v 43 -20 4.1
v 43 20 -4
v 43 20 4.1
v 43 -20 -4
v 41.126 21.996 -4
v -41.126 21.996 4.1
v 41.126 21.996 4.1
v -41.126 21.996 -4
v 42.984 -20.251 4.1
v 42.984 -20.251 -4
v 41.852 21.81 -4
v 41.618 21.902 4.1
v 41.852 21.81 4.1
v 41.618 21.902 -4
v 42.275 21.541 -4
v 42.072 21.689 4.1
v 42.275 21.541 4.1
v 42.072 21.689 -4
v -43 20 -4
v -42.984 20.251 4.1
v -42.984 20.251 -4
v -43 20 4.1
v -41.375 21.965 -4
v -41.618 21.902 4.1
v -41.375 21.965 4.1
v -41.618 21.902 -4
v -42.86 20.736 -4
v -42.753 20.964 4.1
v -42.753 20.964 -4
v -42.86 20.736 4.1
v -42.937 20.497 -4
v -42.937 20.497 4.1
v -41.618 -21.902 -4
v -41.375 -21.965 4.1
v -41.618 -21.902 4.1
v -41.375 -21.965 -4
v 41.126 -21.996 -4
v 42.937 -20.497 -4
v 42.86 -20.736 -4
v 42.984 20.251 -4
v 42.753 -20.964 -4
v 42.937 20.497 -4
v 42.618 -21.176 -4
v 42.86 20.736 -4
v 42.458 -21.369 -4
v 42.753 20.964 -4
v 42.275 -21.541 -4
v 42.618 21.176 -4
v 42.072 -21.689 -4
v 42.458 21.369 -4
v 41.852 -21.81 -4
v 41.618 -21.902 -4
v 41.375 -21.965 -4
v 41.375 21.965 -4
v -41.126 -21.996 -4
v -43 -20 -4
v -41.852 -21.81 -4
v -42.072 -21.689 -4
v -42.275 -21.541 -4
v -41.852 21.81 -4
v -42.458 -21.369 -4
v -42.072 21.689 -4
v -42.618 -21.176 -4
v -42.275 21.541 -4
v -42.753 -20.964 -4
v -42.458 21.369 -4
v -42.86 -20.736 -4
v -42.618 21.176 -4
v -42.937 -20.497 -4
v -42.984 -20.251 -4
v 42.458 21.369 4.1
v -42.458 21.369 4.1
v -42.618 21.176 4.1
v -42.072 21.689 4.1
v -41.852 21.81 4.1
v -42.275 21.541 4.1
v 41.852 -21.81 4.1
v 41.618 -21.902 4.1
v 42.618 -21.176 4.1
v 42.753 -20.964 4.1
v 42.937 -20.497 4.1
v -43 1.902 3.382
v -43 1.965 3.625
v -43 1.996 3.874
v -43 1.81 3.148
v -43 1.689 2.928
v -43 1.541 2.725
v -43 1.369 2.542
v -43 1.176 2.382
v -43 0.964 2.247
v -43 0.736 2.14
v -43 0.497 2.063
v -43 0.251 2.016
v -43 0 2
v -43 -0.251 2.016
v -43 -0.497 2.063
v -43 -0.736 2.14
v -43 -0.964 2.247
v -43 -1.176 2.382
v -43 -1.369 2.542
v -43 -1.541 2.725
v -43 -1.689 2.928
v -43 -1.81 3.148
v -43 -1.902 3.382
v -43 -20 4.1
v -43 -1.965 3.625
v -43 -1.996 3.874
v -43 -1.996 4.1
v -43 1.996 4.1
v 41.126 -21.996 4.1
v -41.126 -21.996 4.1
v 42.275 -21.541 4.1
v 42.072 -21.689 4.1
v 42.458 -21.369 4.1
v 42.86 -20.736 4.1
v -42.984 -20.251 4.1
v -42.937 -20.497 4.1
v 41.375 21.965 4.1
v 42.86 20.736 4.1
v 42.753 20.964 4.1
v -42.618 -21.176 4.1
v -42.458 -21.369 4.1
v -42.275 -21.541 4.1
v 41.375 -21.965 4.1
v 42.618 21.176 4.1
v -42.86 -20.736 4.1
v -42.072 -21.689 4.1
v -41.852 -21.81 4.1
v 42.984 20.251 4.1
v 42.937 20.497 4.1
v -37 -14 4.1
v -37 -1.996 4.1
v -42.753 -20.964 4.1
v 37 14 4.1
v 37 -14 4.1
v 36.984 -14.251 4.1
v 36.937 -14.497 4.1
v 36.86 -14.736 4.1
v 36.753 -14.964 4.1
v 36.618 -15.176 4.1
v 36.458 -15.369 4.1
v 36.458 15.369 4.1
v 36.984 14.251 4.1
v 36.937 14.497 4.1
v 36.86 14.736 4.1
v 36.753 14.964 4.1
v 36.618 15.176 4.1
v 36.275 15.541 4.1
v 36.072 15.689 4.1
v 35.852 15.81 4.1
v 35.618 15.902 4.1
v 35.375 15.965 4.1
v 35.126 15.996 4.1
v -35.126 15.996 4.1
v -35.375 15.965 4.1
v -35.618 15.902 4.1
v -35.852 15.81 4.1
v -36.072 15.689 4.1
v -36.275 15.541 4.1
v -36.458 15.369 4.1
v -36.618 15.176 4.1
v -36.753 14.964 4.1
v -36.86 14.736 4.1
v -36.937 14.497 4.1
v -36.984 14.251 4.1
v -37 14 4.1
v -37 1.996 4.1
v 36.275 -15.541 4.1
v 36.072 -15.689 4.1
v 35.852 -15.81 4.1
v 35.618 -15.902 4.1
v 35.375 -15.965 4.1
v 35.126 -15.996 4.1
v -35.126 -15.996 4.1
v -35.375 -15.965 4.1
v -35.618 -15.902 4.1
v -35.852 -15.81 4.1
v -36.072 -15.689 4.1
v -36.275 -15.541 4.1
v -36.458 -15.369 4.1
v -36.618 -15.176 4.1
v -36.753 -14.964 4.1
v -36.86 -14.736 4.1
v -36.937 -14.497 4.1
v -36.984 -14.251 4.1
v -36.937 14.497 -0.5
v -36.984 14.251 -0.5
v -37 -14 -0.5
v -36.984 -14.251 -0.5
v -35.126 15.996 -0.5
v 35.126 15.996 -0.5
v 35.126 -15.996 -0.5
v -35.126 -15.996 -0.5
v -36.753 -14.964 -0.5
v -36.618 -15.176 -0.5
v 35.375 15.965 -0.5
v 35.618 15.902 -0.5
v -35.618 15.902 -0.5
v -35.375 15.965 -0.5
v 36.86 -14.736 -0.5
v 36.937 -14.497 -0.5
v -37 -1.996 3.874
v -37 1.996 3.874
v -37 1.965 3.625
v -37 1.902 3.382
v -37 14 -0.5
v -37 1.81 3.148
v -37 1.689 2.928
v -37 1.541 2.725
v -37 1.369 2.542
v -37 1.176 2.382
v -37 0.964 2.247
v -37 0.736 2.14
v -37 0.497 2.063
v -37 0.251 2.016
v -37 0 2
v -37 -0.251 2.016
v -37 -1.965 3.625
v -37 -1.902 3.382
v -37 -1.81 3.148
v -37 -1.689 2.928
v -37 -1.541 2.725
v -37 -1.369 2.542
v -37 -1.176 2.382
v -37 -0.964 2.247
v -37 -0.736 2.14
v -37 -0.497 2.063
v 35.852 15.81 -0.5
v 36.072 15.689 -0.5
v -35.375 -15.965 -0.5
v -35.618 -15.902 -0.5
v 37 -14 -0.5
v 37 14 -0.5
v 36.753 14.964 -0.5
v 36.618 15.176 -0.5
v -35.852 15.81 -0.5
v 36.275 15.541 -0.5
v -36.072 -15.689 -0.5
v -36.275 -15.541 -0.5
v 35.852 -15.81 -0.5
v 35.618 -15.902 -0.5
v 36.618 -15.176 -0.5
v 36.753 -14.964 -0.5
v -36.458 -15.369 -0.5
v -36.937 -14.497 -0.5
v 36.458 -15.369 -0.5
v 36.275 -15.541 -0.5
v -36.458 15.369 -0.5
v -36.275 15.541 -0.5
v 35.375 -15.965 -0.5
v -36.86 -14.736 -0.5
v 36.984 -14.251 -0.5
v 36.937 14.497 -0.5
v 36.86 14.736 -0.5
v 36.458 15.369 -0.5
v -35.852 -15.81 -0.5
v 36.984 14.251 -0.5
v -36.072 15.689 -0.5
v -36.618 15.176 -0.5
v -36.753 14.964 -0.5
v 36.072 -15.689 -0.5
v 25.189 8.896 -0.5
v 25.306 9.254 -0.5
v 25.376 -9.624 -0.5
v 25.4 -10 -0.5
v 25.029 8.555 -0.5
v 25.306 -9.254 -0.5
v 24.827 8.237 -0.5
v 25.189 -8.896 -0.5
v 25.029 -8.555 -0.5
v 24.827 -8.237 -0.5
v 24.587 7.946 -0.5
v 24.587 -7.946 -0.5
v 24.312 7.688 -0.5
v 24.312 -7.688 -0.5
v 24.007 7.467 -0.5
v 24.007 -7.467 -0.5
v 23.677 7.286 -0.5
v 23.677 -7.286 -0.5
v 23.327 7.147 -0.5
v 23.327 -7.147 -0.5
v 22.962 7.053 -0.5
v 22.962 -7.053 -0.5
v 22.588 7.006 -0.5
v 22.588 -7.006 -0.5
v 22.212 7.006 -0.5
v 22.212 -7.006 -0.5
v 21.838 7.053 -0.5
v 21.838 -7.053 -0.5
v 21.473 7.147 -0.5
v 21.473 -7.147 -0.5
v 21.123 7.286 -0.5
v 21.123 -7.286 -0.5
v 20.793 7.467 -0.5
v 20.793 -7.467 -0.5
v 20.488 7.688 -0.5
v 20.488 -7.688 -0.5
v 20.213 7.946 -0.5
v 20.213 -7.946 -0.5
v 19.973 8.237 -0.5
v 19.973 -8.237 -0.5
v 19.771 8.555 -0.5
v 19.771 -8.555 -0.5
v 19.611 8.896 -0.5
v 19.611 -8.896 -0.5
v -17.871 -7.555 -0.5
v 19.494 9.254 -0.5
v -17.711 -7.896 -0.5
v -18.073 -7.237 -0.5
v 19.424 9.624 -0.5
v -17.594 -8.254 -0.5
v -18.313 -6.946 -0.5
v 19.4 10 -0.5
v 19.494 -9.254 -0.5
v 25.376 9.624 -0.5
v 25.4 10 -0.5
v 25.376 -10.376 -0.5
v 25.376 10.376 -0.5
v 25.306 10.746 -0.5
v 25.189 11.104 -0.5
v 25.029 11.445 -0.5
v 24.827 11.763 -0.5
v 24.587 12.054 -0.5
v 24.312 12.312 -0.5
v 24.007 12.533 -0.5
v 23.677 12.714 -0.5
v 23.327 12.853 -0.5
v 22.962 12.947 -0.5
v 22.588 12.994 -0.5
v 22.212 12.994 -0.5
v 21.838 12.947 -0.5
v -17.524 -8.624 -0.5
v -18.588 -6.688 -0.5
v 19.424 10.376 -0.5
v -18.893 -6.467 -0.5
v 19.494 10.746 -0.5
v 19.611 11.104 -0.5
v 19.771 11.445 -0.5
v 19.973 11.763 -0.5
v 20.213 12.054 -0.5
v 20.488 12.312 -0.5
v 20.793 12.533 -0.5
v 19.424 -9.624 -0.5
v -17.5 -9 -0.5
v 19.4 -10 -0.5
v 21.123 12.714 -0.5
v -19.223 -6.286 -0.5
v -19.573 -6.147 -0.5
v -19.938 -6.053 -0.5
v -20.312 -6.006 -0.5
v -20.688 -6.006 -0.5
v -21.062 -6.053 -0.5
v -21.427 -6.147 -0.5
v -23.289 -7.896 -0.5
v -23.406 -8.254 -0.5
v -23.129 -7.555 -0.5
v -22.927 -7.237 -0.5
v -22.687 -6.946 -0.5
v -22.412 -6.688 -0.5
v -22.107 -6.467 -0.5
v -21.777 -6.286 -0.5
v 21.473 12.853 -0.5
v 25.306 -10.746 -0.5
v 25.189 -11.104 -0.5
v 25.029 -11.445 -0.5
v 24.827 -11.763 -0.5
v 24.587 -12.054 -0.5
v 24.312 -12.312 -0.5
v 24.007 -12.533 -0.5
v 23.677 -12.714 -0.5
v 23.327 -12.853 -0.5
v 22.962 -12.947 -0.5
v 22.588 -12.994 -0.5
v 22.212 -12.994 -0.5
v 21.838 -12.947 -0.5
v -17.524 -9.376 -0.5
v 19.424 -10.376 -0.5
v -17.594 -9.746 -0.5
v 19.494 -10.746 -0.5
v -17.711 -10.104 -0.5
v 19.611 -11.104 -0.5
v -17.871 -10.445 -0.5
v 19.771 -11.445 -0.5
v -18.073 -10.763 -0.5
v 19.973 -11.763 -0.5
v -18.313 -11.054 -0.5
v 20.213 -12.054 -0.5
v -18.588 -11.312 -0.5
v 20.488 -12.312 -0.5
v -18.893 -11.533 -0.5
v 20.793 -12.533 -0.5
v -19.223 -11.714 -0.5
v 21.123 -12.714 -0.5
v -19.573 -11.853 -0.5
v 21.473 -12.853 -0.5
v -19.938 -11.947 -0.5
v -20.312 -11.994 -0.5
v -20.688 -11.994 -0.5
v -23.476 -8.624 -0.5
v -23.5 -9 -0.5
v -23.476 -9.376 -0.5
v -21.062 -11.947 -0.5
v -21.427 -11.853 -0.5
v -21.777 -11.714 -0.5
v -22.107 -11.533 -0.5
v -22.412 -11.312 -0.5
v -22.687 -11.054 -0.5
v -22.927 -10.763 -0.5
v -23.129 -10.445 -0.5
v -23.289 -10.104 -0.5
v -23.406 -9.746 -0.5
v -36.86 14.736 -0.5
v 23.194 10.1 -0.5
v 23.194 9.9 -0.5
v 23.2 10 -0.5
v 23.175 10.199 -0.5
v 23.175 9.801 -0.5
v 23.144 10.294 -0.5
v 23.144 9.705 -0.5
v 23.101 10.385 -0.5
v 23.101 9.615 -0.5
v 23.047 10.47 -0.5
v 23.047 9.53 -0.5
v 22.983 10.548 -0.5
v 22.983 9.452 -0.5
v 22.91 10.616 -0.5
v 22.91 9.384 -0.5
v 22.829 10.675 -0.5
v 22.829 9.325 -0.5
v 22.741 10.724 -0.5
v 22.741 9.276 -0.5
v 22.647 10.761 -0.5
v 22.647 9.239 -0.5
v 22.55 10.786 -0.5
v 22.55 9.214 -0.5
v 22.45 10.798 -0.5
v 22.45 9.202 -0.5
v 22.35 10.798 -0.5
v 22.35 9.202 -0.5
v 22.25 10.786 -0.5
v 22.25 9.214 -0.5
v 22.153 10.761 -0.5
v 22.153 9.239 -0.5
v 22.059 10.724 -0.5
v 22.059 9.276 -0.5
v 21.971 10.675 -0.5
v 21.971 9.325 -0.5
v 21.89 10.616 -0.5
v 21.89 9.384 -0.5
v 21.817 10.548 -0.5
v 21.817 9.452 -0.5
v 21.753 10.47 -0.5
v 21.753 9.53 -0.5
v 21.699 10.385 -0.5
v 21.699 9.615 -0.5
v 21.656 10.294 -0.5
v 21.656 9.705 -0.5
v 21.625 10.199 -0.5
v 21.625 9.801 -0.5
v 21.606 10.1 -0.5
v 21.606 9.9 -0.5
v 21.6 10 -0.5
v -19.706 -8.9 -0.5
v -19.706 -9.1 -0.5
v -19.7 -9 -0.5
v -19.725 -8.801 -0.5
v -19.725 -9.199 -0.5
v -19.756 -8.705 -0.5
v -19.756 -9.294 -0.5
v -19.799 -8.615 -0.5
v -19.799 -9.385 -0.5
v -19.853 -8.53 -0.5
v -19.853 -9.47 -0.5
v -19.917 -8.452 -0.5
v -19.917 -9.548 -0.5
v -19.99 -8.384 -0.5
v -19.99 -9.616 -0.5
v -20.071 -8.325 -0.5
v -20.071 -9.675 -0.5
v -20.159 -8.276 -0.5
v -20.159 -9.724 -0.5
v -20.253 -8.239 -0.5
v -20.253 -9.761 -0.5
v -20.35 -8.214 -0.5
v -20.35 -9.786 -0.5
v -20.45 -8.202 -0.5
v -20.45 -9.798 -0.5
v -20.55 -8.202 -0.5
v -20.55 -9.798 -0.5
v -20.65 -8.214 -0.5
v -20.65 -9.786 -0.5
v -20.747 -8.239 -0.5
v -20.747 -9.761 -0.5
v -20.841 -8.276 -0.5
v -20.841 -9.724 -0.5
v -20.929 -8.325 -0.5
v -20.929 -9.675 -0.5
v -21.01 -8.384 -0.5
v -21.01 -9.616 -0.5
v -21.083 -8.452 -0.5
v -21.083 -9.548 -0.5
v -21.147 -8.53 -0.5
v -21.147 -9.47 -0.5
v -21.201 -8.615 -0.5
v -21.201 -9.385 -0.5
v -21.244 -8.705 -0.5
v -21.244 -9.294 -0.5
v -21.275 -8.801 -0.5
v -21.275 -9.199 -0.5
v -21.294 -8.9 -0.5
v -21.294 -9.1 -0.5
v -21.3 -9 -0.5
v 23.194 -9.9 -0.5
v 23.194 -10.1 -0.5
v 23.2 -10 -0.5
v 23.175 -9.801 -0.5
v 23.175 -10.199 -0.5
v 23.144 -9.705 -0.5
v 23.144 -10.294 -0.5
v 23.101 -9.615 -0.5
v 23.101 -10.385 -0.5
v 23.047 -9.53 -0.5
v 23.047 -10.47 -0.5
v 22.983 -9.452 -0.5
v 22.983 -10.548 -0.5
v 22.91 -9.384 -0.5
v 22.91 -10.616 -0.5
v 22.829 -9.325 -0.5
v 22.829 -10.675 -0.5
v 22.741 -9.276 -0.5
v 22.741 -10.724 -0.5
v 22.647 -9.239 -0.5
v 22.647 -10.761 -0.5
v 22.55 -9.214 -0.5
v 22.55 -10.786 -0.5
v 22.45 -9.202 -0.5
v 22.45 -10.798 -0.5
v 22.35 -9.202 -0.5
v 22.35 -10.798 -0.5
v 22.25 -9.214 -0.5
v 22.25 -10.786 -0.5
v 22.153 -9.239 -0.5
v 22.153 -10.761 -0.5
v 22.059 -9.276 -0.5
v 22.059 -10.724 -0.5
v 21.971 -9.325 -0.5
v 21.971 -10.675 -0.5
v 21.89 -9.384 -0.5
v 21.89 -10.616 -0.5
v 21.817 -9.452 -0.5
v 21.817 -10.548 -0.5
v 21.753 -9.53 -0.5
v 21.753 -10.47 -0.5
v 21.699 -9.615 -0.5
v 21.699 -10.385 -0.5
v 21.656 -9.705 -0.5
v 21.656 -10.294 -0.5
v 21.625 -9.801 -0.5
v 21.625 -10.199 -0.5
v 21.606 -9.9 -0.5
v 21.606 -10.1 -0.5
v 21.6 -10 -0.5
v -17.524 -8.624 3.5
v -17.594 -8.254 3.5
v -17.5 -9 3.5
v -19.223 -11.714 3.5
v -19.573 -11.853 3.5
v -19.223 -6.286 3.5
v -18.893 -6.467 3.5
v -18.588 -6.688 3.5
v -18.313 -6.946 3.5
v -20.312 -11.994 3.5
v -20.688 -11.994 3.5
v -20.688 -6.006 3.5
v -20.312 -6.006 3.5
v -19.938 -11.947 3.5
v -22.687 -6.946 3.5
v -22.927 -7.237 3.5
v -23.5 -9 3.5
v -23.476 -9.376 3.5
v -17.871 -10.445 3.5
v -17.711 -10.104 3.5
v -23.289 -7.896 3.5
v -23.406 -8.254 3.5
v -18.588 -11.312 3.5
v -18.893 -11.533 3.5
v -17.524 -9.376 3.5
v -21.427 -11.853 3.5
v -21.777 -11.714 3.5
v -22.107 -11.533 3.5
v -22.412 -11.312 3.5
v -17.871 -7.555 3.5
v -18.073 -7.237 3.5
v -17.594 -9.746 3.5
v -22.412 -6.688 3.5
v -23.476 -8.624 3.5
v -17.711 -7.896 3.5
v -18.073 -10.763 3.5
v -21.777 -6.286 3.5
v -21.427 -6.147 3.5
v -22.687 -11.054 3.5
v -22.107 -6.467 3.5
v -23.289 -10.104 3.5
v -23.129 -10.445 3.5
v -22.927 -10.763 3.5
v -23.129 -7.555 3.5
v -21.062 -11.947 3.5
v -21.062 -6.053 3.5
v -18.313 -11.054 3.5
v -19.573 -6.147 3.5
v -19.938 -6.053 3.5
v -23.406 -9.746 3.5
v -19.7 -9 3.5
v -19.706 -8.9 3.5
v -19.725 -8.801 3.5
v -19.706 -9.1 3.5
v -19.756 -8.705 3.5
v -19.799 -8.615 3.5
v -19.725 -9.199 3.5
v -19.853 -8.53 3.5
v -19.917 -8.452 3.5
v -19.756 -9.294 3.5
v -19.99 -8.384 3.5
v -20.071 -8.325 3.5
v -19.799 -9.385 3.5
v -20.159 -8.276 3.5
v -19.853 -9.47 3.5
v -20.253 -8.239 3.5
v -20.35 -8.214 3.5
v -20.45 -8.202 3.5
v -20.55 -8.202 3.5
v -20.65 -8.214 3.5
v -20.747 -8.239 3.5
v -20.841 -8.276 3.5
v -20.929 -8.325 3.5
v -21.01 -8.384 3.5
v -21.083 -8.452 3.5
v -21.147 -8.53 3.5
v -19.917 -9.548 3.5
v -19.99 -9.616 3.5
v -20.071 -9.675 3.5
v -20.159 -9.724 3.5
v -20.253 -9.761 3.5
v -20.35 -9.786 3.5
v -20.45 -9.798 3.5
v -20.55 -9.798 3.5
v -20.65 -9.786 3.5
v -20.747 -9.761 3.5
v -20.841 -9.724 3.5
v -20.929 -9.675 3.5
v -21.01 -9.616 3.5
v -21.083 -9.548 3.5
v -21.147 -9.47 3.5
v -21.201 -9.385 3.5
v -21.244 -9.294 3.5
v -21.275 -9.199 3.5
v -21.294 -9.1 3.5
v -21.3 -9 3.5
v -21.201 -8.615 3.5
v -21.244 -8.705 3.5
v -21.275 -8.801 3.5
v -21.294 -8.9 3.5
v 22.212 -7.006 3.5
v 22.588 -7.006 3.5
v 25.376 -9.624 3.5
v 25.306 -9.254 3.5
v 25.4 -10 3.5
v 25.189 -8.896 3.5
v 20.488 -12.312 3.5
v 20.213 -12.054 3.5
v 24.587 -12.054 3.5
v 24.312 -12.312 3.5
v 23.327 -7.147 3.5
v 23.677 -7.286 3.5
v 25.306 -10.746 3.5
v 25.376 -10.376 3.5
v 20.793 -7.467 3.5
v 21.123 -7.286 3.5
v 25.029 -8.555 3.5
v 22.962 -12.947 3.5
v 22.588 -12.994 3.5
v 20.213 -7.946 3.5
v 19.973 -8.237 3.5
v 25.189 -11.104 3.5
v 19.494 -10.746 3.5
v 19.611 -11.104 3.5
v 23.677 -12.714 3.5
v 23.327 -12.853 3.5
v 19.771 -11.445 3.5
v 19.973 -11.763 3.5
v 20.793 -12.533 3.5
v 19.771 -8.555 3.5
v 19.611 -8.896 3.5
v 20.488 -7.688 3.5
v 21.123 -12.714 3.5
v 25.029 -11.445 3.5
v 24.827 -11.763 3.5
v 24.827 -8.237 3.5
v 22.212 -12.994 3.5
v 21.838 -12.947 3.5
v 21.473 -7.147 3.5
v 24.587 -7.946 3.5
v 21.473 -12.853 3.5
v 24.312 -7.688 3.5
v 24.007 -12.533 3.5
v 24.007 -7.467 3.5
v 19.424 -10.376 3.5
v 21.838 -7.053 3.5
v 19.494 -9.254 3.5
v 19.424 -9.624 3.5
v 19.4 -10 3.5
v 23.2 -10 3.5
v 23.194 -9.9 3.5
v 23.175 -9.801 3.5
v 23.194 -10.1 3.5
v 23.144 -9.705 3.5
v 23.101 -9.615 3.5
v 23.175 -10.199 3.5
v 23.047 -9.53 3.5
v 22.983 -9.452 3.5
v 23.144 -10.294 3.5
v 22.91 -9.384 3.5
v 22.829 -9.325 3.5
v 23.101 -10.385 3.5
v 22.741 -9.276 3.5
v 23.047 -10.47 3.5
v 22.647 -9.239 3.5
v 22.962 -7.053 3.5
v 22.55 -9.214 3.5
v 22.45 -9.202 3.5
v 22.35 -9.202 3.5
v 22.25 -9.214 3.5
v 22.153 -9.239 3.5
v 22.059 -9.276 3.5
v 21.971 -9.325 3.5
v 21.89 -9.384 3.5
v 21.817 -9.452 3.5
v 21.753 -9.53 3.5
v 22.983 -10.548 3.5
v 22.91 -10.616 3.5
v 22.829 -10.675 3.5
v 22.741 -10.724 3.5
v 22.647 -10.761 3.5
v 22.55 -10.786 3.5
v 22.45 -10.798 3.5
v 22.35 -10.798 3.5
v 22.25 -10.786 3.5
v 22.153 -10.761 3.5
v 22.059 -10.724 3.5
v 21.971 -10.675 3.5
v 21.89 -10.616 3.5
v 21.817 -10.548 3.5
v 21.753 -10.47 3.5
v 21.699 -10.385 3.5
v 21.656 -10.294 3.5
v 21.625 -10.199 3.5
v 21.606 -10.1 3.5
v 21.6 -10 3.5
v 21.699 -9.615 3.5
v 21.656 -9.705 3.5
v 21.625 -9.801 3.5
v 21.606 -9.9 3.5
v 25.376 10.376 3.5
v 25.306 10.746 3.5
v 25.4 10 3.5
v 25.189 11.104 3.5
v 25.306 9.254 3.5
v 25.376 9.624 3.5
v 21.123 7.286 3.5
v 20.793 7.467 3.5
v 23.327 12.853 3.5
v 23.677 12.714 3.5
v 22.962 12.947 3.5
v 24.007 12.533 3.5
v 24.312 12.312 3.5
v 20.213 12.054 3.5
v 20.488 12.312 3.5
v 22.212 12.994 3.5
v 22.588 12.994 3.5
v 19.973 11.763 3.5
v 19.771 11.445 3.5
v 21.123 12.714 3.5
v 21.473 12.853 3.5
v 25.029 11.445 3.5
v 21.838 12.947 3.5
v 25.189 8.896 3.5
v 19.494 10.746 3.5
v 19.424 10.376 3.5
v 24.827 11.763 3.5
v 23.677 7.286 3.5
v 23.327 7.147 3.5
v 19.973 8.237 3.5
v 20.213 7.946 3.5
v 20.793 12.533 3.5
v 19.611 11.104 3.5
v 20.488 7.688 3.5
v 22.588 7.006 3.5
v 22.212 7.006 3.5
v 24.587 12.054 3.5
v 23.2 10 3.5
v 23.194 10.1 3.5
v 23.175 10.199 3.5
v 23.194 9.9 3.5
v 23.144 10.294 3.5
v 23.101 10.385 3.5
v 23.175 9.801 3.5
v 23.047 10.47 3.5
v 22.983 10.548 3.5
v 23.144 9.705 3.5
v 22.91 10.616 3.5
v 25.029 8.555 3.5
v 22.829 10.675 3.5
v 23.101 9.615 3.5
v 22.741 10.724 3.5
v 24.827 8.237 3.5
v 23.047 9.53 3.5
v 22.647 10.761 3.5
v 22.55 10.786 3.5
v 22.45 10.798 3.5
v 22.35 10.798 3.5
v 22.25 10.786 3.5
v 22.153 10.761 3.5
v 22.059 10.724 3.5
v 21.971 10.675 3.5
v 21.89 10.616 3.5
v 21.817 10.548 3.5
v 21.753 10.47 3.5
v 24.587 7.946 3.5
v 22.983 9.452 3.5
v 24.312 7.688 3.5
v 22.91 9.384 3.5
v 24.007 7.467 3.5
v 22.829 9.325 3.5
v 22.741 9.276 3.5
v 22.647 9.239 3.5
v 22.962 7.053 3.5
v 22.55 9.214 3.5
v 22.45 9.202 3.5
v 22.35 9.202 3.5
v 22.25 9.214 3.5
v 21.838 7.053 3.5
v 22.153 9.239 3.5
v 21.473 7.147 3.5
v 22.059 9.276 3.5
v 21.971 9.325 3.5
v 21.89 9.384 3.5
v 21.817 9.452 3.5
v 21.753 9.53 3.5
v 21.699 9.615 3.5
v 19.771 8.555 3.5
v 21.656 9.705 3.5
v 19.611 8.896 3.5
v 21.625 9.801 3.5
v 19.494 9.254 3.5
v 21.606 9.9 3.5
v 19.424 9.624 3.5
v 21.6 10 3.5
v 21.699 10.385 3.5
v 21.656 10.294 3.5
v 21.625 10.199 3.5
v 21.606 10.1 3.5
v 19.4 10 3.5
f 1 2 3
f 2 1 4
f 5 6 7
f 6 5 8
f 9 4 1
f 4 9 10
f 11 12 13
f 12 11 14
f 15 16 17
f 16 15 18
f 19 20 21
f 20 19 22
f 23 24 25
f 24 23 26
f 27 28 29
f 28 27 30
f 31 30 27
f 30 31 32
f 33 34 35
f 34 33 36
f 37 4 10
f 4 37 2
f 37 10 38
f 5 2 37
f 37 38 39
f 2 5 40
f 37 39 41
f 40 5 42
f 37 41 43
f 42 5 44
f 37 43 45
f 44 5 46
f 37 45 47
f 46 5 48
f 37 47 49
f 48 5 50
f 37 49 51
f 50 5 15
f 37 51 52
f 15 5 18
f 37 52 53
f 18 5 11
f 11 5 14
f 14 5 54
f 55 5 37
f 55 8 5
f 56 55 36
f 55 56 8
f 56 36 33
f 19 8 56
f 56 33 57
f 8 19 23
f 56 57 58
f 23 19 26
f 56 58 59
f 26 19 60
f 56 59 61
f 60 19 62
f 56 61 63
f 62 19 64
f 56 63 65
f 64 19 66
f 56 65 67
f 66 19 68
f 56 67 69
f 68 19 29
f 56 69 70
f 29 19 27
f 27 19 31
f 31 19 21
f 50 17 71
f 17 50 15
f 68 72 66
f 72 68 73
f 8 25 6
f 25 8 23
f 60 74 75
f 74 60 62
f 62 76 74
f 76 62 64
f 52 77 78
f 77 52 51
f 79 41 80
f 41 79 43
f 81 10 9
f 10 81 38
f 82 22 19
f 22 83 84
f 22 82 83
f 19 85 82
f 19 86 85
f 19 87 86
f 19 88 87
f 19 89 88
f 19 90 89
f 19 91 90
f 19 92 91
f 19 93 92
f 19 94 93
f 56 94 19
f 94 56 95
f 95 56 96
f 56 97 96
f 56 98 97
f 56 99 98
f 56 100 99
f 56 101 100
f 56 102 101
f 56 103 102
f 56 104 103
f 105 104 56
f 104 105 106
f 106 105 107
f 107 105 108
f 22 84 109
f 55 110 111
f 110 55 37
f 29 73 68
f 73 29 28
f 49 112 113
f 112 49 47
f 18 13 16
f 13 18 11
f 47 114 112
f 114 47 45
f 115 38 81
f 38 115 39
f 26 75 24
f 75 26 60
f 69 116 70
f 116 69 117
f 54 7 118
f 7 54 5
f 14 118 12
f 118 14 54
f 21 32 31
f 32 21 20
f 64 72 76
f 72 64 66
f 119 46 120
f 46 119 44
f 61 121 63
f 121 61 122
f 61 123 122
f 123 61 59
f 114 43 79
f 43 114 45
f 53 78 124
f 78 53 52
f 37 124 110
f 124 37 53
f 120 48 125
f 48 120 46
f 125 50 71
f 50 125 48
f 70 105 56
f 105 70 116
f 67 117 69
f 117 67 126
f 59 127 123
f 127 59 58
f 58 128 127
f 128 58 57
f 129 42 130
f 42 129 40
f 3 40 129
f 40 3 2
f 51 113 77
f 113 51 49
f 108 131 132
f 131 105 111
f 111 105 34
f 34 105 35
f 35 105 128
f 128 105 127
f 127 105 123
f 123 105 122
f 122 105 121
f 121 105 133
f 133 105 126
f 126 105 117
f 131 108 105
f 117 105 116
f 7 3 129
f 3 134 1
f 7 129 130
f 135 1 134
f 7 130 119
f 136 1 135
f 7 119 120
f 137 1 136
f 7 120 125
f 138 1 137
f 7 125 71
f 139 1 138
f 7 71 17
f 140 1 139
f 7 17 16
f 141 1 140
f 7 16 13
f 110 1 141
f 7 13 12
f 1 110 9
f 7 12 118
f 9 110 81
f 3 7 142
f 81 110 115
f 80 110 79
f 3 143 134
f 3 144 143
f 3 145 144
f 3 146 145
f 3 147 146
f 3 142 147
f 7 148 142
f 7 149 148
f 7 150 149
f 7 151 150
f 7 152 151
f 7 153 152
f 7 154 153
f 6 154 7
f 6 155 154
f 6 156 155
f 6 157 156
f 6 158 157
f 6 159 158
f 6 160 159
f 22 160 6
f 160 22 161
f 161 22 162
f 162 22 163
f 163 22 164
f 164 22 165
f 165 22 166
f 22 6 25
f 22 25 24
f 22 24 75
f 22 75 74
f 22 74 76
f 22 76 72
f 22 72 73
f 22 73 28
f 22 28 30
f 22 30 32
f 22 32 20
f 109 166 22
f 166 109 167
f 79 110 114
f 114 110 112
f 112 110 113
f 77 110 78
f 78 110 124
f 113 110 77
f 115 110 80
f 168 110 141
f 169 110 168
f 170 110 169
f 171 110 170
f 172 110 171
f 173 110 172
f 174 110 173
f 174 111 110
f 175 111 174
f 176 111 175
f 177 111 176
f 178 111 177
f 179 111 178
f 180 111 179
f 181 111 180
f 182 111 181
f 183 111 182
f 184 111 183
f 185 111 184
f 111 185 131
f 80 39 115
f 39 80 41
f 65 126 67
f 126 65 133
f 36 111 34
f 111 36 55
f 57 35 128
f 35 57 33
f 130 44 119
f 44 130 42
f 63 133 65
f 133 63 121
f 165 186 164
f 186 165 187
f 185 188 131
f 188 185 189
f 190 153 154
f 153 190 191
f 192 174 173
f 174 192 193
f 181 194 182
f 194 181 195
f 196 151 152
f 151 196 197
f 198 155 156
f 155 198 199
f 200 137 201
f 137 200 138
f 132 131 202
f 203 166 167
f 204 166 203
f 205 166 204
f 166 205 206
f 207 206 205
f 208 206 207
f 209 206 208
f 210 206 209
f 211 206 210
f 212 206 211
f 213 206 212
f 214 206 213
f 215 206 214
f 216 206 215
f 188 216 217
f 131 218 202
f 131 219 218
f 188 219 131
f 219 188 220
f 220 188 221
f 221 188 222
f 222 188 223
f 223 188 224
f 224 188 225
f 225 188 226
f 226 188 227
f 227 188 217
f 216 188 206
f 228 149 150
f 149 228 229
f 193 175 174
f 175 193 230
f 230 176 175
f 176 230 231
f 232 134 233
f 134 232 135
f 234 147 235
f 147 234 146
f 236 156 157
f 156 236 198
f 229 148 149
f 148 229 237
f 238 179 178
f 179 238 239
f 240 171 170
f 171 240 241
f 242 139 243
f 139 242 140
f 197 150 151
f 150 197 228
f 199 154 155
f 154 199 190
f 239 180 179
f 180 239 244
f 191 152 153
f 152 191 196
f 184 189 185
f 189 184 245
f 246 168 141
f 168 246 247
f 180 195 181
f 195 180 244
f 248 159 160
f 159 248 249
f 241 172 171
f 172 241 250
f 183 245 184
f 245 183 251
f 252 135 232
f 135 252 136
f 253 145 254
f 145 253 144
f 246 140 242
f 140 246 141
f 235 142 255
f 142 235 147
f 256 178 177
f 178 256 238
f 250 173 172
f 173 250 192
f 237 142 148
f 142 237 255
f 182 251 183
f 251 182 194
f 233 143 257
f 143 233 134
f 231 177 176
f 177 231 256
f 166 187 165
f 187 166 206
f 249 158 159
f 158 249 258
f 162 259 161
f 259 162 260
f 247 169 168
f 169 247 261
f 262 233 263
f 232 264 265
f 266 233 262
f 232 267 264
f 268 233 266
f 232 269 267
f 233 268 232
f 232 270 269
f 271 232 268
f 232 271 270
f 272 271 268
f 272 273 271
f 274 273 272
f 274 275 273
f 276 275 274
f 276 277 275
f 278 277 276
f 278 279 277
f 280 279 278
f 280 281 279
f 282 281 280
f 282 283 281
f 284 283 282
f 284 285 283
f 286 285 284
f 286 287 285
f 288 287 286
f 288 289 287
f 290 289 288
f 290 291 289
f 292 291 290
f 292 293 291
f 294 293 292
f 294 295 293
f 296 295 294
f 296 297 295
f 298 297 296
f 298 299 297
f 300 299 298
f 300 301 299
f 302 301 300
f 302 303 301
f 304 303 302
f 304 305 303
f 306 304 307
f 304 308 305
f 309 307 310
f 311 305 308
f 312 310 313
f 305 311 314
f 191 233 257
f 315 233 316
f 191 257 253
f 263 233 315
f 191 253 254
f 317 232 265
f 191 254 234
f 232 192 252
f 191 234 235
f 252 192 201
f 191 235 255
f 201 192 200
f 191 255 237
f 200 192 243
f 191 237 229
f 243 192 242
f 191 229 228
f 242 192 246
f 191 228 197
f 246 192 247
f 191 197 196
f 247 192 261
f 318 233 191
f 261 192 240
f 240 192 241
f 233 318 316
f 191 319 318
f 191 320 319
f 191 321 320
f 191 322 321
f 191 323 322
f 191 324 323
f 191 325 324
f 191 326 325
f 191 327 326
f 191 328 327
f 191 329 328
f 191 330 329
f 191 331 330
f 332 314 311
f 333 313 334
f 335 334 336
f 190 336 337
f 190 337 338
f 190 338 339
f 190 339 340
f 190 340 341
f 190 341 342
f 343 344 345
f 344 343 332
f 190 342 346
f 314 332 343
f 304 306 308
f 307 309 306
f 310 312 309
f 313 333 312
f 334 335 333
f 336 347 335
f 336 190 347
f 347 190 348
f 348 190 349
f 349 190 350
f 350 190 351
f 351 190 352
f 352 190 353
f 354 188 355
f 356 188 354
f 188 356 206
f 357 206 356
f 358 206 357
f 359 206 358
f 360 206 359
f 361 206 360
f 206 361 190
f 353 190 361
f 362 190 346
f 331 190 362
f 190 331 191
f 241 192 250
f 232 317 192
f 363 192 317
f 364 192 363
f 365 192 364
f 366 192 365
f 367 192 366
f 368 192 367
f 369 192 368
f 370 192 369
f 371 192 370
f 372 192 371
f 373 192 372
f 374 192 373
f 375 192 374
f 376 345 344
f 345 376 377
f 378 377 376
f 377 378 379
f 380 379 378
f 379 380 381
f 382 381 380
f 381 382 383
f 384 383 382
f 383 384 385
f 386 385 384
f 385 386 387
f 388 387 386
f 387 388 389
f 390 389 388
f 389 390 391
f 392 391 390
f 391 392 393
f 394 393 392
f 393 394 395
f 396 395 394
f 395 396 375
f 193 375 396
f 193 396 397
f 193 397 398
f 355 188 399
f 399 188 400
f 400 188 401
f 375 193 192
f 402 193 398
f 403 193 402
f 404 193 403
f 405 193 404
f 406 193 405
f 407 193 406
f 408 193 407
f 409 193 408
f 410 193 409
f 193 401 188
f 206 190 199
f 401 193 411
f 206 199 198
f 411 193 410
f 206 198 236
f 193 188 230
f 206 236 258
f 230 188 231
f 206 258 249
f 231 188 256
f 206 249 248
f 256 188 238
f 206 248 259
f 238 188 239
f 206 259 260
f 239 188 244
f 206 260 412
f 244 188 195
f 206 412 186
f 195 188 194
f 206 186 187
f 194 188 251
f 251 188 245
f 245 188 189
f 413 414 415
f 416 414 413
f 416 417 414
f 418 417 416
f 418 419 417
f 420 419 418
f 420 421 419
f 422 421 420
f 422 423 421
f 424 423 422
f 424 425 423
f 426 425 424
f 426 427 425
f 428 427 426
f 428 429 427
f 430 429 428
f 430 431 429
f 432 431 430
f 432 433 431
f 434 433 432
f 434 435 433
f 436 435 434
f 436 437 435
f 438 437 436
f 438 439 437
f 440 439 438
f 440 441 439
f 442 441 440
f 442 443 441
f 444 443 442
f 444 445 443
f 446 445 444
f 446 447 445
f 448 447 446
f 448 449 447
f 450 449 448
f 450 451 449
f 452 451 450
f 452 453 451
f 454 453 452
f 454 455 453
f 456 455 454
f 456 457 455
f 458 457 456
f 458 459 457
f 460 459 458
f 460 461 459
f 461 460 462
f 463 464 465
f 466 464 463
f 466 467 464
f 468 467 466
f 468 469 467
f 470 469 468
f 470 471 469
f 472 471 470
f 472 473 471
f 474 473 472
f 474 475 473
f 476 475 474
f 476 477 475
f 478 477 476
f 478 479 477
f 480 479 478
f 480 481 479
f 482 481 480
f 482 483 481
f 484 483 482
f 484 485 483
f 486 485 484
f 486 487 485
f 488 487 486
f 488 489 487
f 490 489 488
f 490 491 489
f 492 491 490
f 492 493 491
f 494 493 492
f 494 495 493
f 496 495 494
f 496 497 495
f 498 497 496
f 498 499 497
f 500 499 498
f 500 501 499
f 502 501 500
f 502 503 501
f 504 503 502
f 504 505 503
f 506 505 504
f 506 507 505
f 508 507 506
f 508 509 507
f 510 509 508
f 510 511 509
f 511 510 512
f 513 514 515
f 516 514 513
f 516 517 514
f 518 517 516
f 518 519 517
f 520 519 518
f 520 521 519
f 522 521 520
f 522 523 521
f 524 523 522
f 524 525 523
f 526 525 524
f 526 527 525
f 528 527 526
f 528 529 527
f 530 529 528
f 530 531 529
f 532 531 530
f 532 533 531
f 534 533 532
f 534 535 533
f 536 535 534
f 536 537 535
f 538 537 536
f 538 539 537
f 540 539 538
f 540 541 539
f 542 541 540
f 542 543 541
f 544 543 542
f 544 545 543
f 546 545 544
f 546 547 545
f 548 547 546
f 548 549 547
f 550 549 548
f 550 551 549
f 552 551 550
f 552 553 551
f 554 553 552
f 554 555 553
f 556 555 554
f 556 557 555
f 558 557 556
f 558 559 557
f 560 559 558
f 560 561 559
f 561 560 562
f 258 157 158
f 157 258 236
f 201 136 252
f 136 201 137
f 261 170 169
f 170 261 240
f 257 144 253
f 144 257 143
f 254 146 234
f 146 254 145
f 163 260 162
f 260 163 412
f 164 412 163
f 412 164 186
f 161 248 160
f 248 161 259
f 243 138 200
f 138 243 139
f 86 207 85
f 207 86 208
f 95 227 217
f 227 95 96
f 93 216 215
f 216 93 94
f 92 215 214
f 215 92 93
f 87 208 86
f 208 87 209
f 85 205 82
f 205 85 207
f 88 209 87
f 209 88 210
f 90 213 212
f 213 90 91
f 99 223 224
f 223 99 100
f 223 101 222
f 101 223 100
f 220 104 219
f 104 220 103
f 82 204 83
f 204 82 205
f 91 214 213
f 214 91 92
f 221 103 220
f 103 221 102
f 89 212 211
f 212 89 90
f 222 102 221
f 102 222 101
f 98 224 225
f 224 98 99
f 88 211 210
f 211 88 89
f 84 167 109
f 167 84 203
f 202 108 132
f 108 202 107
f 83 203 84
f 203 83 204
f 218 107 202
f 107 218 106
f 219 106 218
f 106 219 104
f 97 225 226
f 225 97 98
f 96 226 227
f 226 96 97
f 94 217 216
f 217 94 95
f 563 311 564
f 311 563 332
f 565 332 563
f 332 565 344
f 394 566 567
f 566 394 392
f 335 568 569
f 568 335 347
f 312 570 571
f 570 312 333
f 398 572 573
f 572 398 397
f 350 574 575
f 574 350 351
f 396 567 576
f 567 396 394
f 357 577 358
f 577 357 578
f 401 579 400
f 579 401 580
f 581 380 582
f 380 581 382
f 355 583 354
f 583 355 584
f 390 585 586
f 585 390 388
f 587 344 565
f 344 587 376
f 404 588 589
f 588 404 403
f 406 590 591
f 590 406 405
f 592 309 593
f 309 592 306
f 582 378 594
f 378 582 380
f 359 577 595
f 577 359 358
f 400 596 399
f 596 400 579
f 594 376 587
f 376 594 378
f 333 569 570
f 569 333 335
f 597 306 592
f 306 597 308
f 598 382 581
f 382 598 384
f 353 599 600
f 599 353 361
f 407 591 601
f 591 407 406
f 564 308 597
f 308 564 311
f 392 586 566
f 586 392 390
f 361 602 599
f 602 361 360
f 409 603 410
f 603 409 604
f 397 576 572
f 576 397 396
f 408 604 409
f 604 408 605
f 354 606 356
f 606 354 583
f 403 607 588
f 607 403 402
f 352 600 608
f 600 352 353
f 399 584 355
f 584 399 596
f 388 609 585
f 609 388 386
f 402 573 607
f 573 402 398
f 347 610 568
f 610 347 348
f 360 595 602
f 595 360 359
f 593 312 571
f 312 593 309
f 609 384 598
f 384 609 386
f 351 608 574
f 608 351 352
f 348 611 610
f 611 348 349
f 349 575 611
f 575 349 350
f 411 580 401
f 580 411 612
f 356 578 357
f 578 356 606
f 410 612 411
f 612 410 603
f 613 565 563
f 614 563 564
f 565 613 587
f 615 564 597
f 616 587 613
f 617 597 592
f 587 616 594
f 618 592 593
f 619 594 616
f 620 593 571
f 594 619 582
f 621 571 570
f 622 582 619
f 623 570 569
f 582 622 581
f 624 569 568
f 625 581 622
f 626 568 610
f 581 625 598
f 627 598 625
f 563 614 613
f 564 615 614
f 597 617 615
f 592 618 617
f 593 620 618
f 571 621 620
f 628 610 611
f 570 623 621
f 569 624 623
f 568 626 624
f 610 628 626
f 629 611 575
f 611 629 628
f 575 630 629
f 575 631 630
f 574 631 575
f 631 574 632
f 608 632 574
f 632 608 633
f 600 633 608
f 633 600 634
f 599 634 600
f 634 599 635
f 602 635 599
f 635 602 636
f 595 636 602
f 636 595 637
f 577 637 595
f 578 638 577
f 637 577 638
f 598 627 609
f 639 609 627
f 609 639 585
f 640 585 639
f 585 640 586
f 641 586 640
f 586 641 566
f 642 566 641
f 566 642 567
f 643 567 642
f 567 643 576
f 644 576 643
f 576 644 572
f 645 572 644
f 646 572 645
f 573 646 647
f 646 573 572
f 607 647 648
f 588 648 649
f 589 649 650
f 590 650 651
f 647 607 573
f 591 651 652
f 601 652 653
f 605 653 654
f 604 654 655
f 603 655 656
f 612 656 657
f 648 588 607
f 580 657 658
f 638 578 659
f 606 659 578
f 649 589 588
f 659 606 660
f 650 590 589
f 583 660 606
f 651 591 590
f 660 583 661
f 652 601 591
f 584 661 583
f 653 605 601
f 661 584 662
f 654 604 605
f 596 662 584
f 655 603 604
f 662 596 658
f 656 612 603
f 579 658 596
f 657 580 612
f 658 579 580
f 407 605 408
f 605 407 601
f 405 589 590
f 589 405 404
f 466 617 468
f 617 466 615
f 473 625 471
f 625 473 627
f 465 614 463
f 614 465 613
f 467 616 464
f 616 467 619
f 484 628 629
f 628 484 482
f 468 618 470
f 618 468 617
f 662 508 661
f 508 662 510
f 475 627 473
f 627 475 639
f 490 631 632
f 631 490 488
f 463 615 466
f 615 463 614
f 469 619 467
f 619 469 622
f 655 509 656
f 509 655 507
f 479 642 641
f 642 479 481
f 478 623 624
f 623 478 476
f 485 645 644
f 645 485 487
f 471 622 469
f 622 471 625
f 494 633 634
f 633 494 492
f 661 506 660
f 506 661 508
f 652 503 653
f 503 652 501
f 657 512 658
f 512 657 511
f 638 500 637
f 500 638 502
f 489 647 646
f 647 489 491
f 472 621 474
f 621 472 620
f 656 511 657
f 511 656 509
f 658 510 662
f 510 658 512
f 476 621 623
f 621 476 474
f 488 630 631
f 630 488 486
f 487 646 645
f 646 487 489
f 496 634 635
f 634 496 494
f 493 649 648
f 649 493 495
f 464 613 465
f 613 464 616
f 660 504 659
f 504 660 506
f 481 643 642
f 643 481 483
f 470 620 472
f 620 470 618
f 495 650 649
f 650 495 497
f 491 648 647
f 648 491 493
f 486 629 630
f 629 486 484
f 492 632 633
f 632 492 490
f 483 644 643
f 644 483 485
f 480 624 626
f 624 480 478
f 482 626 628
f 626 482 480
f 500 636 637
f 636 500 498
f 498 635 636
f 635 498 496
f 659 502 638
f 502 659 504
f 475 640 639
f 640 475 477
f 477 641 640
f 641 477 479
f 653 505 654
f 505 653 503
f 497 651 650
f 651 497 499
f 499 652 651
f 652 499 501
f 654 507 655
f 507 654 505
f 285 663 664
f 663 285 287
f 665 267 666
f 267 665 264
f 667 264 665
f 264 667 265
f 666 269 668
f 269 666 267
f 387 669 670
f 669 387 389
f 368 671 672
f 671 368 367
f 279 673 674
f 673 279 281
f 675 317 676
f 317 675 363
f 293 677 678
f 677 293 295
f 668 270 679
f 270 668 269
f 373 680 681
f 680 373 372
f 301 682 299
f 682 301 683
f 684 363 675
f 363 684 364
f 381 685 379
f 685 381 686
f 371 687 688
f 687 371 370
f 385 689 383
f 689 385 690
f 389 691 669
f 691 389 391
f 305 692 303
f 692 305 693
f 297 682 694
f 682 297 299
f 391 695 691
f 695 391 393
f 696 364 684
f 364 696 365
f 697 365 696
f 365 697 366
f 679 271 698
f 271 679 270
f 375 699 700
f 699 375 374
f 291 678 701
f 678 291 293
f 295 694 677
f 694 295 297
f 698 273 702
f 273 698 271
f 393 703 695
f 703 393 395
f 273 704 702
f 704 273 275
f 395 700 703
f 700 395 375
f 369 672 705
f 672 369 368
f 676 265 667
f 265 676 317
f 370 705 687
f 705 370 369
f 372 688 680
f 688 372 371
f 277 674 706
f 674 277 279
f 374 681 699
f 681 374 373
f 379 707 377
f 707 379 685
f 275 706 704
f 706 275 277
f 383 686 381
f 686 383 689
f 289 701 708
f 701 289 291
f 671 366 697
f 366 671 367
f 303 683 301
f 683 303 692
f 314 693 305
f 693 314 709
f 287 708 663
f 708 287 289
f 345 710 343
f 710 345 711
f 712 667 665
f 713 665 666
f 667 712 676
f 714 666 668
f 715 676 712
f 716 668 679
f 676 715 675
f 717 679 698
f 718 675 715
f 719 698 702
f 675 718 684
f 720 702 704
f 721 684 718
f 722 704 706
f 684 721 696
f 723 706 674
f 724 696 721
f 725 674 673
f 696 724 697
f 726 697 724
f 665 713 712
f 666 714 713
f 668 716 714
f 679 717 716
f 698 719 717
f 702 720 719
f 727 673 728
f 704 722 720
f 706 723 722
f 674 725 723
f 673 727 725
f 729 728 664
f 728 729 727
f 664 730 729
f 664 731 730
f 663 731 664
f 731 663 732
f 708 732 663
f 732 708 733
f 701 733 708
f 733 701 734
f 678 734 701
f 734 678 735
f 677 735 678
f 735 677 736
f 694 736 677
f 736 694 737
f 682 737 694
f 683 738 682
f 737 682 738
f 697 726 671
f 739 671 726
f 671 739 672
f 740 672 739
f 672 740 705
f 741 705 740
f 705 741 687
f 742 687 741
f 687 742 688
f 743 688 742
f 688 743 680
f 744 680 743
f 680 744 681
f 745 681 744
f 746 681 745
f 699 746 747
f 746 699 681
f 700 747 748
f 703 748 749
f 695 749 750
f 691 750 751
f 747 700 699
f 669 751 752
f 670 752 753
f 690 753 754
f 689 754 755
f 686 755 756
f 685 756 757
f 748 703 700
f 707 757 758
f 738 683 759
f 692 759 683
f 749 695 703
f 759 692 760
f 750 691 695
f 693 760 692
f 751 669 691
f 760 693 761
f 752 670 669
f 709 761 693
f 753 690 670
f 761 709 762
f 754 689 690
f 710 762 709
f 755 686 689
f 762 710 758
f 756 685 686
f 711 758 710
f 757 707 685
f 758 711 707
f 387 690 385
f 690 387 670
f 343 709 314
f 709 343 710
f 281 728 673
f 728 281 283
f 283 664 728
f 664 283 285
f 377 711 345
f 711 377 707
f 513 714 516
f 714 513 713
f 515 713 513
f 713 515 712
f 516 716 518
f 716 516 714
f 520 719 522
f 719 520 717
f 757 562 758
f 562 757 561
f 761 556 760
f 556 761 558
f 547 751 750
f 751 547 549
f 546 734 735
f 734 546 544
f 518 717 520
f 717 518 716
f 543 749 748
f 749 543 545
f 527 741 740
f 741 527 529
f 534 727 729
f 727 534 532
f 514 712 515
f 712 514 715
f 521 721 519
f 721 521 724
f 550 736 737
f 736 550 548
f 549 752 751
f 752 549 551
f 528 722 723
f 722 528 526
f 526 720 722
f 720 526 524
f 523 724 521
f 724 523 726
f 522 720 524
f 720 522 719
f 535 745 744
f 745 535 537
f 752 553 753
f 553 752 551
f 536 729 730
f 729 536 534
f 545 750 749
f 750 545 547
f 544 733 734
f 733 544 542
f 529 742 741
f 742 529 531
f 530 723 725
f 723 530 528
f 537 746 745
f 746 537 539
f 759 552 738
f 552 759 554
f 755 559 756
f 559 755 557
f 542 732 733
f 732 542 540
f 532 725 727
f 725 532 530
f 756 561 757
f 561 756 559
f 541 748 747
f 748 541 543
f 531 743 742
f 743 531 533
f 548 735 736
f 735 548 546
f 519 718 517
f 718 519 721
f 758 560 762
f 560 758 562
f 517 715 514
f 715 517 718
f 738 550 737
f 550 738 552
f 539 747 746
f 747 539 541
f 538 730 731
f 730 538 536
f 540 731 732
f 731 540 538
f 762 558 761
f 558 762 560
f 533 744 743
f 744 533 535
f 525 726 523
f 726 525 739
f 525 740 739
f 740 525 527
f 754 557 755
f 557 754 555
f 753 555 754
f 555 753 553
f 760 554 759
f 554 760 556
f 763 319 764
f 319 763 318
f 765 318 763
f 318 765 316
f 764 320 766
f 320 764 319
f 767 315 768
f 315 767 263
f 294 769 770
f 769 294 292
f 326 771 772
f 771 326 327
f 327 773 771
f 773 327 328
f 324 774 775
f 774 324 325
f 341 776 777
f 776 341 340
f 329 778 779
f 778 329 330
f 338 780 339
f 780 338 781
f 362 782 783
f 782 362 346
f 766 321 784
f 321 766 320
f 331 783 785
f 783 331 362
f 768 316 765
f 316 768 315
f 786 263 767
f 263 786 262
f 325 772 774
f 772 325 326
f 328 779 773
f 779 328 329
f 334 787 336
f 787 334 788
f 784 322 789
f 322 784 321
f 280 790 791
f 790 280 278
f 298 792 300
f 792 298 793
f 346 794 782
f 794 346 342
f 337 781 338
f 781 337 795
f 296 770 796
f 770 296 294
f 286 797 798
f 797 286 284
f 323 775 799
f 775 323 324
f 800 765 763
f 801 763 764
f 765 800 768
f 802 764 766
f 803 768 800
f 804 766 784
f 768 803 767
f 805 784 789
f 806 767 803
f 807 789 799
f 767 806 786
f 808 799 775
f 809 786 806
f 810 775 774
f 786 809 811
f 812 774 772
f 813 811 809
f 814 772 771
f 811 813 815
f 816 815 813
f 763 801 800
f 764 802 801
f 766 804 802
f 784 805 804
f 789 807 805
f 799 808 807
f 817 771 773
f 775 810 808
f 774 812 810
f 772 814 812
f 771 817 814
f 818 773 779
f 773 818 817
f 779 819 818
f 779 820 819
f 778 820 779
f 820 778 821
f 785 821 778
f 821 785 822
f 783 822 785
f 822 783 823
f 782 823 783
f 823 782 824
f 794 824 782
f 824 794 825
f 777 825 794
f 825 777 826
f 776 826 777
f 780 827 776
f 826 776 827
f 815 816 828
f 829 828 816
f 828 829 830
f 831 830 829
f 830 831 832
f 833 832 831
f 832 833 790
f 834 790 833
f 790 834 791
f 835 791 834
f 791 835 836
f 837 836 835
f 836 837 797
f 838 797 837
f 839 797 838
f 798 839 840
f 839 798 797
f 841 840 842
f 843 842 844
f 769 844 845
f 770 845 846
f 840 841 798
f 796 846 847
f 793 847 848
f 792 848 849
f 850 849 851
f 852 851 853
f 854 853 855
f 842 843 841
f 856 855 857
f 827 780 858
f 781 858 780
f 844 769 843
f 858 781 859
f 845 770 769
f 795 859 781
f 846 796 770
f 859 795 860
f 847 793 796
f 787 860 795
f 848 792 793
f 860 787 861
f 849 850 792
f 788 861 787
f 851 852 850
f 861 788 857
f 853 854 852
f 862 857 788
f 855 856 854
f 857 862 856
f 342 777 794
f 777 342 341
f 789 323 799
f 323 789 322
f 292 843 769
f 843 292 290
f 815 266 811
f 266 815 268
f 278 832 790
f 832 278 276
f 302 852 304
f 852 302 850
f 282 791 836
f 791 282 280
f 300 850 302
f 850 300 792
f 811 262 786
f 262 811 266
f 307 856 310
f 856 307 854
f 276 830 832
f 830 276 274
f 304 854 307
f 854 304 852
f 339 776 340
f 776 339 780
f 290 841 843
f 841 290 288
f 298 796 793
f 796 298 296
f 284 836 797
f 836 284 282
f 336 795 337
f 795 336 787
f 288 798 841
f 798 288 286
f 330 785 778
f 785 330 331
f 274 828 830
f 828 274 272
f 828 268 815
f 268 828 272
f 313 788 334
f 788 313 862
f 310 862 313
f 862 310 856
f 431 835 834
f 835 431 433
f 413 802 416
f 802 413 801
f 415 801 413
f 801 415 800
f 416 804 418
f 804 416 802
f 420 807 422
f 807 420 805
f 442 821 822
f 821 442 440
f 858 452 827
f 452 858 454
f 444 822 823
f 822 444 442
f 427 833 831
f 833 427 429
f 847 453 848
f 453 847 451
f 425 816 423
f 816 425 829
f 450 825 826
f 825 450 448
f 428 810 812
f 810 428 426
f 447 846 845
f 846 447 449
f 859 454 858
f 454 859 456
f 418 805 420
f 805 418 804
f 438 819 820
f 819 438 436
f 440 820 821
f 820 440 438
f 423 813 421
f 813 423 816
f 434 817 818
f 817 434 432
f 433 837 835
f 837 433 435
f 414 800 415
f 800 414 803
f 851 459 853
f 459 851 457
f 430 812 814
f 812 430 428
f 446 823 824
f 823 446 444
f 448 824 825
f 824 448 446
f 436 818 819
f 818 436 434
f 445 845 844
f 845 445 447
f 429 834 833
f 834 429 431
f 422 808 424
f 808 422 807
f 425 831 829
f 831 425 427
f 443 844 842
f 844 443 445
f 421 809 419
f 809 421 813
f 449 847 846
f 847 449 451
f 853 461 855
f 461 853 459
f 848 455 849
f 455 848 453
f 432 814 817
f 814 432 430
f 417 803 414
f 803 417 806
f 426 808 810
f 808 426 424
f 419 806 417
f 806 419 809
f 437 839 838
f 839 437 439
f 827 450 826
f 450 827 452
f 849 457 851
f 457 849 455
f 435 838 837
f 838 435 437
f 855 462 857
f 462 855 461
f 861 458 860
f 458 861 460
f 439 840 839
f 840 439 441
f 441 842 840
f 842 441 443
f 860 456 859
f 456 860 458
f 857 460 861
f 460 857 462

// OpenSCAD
  difference(){  minkowski(){ cube([82,40,8],center=true); 
cylinder(r=2,h=0.1,$fn=50); 
}  //Creates solid rounded L70,H40,W8 rectangle.

 translate([0,0,2])minkowski(){ cube([70,28,5],center=true); 
cylinder(r=2,h=0.1,$fn=50); 
}  //Creates solid rounded L61,H31,W5 rectangle. W5 is W4+1 to make sure goes all the way through front face. 6mm border, 3mm on either side.
translate([-35,0,4])rotate([0,-90,0])cylinder(r=2,h=10,$fn=50); //Cylindrical cut out for wire
} 
//creates hollow shell, 6mm border.

difference(){translate([-20.5,-9,-1])cylinder(r=3,h=4.5,$fn=50);//H(3.5+1) then translate -1z to ensure joined. screw cylinder.
translate([-20.5,-9,-1])cylinder(r=0.8,h=4.5,$fn=50); // inner cylinder.
} 
// Bottom left cylinder, takes MI.6 Screw.

difference(){translate([22.4,-10,-1])cylinder(r=3,h=4.5,$fn=50);//H(3.5+1) then translate -1z to ensure joined. Bottom right screw cylinder.
translate([22.4,-10,-1])cylinder(r=0.8,h=4.5,$fn=50); //inner cylinder.
}
//Bottom right cylinder, takes M1.6 screw.

difference(){translate([22.4,10,-1])cylinder(r=3,h=4.5,$fn=50); //H(3.5+1) then translate -1z to ensure joined. Top right screw cylinder.
translate([22.4,10,-1])cylinder(r=0.8,h=4.5,$fn=50); //inner cylinder.
}
//Top right cylinder, takes M1.6 screw.
